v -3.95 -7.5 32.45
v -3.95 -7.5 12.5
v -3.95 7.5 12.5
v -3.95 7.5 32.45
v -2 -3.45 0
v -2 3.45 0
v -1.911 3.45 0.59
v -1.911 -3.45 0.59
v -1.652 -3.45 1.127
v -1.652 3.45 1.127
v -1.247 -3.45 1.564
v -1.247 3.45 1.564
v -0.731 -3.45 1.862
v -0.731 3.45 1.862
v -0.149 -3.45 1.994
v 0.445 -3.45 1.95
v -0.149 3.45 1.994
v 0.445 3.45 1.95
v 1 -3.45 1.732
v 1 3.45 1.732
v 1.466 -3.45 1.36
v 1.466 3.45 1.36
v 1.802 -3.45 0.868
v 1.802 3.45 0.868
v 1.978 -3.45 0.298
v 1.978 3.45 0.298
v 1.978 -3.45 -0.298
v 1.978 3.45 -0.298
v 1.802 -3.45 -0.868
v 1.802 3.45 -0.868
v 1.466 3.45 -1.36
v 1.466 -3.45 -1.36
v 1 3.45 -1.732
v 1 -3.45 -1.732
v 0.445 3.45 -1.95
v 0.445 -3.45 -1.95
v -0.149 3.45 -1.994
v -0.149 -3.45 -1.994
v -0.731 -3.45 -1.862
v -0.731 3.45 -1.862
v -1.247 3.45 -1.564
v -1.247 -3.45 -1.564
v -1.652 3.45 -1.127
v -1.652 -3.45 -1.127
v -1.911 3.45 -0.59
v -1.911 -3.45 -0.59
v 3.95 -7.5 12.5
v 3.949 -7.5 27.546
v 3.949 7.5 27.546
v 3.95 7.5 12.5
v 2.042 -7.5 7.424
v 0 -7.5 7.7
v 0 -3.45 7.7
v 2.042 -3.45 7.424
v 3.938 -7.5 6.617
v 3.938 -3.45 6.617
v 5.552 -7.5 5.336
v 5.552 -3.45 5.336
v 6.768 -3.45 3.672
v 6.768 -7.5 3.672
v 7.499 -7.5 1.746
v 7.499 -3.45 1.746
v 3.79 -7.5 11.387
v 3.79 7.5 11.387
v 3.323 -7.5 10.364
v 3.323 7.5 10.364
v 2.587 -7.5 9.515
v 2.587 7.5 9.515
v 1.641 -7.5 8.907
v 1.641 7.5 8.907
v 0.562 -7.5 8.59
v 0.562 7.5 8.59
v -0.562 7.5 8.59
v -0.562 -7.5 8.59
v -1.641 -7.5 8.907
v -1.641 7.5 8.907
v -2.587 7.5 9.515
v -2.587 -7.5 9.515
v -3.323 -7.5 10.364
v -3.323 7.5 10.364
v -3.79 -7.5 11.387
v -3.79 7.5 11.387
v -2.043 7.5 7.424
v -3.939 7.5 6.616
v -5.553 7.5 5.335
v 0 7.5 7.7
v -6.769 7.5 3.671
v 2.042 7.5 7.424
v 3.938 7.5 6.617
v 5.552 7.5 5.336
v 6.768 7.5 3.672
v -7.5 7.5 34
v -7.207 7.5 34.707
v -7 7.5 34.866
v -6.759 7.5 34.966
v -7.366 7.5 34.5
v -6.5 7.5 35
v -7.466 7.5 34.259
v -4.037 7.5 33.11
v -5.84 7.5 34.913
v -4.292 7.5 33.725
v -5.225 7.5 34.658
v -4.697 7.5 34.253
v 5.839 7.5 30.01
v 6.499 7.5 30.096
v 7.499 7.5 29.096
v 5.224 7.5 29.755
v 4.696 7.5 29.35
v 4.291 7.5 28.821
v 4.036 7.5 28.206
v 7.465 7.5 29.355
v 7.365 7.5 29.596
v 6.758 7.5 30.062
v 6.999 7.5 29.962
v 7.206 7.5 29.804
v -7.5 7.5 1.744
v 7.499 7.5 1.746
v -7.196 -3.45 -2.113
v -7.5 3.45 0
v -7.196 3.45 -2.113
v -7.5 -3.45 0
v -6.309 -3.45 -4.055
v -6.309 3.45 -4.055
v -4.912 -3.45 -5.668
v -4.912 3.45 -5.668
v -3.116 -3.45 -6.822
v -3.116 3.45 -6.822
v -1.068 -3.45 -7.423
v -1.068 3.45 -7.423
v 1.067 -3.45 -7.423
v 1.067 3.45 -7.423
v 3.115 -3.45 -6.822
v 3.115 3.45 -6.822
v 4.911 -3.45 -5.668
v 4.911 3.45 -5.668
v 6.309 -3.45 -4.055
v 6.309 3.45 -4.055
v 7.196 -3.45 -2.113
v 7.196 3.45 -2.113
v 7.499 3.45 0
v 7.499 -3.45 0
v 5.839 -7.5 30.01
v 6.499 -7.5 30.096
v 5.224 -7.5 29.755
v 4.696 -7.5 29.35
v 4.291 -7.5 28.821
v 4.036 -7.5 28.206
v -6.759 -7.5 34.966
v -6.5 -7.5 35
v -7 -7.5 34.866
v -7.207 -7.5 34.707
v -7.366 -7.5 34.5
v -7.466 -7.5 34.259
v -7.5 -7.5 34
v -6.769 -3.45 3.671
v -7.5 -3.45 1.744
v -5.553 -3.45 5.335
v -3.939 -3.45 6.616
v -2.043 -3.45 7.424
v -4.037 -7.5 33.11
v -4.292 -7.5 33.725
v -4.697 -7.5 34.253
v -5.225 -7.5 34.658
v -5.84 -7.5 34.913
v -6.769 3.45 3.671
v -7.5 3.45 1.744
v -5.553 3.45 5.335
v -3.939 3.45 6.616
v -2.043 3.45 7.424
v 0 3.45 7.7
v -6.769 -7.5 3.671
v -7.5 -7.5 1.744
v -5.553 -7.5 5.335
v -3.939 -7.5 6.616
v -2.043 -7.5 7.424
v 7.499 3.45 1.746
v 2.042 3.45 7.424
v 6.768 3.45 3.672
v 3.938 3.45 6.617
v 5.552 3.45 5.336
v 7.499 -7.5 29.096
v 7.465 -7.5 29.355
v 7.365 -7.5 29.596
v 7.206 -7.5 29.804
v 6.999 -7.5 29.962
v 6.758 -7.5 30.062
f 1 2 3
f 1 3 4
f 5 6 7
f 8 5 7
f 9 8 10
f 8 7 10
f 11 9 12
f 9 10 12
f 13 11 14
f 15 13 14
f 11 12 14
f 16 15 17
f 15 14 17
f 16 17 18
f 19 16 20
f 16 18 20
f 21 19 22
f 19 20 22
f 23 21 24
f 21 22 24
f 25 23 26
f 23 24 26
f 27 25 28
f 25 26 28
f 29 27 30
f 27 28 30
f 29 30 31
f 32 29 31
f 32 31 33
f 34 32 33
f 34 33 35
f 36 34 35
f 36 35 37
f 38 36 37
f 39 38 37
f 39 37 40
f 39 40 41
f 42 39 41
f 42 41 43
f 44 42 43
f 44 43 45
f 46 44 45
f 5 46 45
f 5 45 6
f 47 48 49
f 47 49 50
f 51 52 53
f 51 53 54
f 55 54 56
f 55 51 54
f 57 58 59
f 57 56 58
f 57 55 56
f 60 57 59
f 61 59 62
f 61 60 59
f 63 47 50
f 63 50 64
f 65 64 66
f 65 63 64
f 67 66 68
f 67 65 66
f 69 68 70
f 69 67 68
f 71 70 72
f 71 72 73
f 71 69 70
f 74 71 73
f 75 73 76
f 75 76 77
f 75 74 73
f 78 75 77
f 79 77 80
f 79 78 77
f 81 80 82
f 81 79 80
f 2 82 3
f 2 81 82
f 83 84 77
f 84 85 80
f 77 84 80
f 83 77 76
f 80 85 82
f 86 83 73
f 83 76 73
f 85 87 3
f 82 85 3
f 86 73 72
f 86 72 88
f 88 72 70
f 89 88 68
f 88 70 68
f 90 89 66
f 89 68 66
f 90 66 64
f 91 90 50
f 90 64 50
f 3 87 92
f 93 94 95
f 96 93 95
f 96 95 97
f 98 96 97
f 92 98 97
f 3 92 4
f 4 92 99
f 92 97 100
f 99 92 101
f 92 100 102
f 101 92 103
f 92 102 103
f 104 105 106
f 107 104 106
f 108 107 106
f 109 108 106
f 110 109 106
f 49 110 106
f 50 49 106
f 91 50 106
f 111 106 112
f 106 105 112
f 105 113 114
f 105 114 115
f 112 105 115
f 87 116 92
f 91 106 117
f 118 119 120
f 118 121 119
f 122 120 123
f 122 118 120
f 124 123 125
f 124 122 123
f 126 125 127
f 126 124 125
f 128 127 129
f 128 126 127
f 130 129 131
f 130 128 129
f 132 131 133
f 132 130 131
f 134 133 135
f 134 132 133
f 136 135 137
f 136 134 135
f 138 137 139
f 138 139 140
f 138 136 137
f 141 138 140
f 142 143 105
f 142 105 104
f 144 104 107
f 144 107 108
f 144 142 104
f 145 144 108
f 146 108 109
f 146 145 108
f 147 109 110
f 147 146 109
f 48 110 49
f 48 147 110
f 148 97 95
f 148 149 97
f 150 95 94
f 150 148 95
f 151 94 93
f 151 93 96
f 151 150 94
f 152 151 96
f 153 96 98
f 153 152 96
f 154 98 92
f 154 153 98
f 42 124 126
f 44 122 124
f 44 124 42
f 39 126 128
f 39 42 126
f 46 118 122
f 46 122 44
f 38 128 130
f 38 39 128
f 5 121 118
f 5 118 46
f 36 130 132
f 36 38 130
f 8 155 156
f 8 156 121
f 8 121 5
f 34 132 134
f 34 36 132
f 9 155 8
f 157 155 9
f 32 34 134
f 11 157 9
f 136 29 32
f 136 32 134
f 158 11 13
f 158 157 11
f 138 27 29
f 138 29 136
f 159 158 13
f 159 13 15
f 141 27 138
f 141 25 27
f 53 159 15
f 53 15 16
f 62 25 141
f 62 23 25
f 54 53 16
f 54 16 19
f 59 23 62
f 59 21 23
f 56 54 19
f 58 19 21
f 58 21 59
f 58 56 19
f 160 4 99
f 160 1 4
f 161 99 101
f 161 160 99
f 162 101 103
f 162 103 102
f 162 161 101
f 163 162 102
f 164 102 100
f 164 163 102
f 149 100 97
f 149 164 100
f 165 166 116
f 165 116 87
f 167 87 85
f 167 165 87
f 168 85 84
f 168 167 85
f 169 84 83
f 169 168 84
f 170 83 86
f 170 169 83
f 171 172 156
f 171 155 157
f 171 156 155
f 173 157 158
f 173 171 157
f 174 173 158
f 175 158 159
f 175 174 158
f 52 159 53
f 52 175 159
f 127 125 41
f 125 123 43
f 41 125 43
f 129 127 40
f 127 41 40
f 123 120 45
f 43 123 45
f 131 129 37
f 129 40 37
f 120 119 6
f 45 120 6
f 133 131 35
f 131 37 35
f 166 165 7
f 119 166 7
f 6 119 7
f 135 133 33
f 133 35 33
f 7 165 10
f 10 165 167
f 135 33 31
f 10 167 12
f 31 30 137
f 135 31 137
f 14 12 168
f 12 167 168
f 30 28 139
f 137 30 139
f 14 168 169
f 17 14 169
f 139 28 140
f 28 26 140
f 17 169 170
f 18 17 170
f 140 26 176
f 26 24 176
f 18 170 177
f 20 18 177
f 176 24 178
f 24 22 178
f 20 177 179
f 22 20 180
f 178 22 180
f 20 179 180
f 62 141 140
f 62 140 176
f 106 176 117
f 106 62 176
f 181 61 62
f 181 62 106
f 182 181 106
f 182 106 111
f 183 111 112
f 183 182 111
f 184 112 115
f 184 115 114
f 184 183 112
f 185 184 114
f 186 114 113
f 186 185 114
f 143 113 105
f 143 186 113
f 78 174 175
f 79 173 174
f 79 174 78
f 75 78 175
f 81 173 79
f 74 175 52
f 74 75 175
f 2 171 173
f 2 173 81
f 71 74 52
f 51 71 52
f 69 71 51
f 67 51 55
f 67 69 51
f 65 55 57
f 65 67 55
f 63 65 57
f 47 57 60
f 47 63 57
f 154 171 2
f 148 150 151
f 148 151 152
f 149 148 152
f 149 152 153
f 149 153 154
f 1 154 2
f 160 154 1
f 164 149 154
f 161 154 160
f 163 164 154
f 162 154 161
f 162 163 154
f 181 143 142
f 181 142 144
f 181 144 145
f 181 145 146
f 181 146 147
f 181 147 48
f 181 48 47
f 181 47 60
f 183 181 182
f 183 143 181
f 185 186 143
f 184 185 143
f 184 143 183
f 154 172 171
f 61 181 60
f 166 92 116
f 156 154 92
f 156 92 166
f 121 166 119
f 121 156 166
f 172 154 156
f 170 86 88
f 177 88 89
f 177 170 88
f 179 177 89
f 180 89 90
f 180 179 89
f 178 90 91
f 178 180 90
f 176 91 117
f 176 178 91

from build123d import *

# Parameters (mm, degrees)
F1_DEPTH = 7.5
F2_DEPTH = 3.45
F4_D     = 4


with BuildPart() as f1:
    # F0 (on Front) → F1 (new body, symmetric)
    with BuildSketch(Plane.XZ):
        with BuildLine():
            Line((-7.5, 34), (-7.5, 1.74356))
            ThreePointArc((-7.5, 1.74356), (-4.788768, 6.029735), (0, 7.7))
            ThreePointArc((0, 7.7), (4.787697, 6.030585), (7.49938, 1.746224))
            Line((7.49938, 1.746224), (7.49938, 29.096422))
            ThreePointArc((7.49938, 29.096422), (7.206487, 29.803529), (6.49938, 30.096422))
            ThreePointArc((6.49938, 30.096422), (4.696258, 29.349544), (3.94938, 27.546422))
            Line((3.94938, 27.546422), (3.95, 12.5))
            ThreePointArc((3.95, 12.5), (0, 8.55), (-3.95, 12.5))
            Line((-3.95, 12.5), (-3.95, 32.45))
            ThreePointArc((-3.95, 32.45), (-4.696878, 34.253122), (-6.5, 35))
            ThreePointArc((-6.5, 35), (-7.207107, 34.707107), (-7.5, 34))
        make_face()
    extrude(amount=F1_DEPTH, both=True)

    # F0 (on Front) → F2 (join, symmetric)
    with BuildSketch(Plane.XZ):
        with BuildLine():
            Line((0, 0), (-7.5, 0))
            ThreePointArc((-7.5, 0), (-0.00031, -7.49969), (7.49938, 0))
            Line((7.49938, 0), (0, 0))
        make_face()
        with BuildLine():
            Line((-7.5, 1.74356), (-7.5, 0))
            Line((-7.5, 0), (0, 0))
            Line((0, 0), (0, 7.7))
            ThreePointArc((0, 7.7), (-4.788768, 6.029735), (-7.5, 1.74356))
        make_face()
        with BuildLine():
            Line((0, 0), (7.49938, 0))
            Line((7.49938, 0), (7.49938, 1.746224))
            ThreePointArc((7.49938, 1.746224), (4.787697, 6.030585), (0, 7.7))
            Line((0, 7.7), (0, 0))
        make_face()
    extrude(amount=F2_DEPTH, both=True)

    # F4 (through all)
    with Locations(Plane.XZ.offset(3.45)):
        with Locations((0, 0)):
            Hole(F4_D / 2)


solid = f1.part
